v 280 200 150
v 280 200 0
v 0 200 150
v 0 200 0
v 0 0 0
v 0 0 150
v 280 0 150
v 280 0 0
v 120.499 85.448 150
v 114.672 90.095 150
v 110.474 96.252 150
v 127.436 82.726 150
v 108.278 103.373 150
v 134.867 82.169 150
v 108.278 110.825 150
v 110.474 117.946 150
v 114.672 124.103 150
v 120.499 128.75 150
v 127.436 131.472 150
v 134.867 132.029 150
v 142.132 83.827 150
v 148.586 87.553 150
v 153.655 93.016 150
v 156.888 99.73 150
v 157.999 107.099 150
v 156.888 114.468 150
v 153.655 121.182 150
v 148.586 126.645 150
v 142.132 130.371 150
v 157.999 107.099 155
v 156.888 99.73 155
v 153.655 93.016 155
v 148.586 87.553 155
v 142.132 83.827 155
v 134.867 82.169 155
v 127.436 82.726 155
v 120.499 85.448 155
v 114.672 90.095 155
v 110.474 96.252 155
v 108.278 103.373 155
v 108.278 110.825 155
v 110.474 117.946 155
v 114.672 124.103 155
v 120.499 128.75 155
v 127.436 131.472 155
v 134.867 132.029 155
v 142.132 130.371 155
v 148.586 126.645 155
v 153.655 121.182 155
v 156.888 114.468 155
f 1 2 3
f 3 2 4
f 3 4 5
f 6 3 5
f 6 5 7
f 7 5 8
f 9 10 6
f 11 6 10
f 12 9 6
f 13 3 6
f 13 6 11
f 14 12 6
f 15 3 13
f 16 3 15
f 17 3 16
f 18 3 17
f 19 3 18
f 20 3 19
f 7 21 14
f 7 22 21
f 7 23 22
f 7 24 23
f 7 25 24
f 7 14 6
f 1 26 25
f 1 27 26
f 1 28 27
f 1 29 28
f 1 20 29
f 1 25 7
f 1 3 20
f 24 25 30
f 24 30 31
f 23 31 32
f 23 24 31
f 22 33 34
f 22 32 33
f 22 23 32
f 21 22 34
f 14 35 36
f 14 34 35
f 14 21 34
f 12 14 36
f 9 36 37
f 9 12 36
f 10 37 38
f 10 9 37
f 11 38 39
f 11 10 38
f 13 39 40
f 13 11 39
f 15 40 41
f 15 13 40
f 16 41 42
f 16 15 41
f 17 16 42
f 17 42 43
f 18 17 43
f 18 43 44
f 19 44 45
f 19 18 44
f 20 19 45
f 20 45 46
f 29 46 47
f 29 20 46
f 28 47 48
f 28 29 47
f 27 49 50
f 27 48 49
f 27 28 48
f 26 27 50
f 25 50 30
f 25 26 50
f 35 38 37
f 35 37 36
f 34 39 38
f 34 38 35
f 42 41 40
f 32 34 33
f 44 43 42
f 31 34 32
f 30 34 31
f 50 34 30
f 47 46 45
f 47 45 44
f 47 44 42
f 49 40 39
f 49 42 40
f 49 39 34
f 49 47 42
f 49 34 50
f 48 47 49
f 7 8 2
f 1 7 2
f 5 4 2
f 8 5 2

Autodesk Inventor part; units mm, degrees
ref_plane "YZ Plane" through (0, 0, 0) normal (1, 0, 0) x (0, 1, 0)
ref_plane "XZ Plane" through (0, 0, 0) normal (0, 1, 0) x (-1, 0, 0)
ref_plane "XY Plane" through (0, 0, 0) normal (0, 0, 1) x (1, 0, 0)
sketch "Sketch2" plane through (0, 0, 0) normal (0, 0, 1) x (1, 0, 0)
  point P0 (0, 0)
sketch "Sketch3" plane through (0, 0, 0) normal (0, 0, 1) x (1, 0, 0)
  line L0 (0, 0) -> (280, 0)
  line L1 (280, 0) -> (280, 200)
  line L2 (280, 200) -> (0, 200)
  line L3 (0, 200) -> (0, 0)
  dimension "d0" = 280
  dimension "d1" = 200
extrude "Extrusion1" add sketch "Sketch3" along normal blind 150
sketch "Sketch4" plane through (0, 0, 150) normal (0, 0, 1) x (1, 0, 0)
  circle A0 centre (132.9986, 107.0989) radius 25
  point P0 (0, 0)
  dimension "d4" = 50
extrude "Extrusion2" add sketch "Sketch4" along normal blind 5
properties part number "Sensor"
